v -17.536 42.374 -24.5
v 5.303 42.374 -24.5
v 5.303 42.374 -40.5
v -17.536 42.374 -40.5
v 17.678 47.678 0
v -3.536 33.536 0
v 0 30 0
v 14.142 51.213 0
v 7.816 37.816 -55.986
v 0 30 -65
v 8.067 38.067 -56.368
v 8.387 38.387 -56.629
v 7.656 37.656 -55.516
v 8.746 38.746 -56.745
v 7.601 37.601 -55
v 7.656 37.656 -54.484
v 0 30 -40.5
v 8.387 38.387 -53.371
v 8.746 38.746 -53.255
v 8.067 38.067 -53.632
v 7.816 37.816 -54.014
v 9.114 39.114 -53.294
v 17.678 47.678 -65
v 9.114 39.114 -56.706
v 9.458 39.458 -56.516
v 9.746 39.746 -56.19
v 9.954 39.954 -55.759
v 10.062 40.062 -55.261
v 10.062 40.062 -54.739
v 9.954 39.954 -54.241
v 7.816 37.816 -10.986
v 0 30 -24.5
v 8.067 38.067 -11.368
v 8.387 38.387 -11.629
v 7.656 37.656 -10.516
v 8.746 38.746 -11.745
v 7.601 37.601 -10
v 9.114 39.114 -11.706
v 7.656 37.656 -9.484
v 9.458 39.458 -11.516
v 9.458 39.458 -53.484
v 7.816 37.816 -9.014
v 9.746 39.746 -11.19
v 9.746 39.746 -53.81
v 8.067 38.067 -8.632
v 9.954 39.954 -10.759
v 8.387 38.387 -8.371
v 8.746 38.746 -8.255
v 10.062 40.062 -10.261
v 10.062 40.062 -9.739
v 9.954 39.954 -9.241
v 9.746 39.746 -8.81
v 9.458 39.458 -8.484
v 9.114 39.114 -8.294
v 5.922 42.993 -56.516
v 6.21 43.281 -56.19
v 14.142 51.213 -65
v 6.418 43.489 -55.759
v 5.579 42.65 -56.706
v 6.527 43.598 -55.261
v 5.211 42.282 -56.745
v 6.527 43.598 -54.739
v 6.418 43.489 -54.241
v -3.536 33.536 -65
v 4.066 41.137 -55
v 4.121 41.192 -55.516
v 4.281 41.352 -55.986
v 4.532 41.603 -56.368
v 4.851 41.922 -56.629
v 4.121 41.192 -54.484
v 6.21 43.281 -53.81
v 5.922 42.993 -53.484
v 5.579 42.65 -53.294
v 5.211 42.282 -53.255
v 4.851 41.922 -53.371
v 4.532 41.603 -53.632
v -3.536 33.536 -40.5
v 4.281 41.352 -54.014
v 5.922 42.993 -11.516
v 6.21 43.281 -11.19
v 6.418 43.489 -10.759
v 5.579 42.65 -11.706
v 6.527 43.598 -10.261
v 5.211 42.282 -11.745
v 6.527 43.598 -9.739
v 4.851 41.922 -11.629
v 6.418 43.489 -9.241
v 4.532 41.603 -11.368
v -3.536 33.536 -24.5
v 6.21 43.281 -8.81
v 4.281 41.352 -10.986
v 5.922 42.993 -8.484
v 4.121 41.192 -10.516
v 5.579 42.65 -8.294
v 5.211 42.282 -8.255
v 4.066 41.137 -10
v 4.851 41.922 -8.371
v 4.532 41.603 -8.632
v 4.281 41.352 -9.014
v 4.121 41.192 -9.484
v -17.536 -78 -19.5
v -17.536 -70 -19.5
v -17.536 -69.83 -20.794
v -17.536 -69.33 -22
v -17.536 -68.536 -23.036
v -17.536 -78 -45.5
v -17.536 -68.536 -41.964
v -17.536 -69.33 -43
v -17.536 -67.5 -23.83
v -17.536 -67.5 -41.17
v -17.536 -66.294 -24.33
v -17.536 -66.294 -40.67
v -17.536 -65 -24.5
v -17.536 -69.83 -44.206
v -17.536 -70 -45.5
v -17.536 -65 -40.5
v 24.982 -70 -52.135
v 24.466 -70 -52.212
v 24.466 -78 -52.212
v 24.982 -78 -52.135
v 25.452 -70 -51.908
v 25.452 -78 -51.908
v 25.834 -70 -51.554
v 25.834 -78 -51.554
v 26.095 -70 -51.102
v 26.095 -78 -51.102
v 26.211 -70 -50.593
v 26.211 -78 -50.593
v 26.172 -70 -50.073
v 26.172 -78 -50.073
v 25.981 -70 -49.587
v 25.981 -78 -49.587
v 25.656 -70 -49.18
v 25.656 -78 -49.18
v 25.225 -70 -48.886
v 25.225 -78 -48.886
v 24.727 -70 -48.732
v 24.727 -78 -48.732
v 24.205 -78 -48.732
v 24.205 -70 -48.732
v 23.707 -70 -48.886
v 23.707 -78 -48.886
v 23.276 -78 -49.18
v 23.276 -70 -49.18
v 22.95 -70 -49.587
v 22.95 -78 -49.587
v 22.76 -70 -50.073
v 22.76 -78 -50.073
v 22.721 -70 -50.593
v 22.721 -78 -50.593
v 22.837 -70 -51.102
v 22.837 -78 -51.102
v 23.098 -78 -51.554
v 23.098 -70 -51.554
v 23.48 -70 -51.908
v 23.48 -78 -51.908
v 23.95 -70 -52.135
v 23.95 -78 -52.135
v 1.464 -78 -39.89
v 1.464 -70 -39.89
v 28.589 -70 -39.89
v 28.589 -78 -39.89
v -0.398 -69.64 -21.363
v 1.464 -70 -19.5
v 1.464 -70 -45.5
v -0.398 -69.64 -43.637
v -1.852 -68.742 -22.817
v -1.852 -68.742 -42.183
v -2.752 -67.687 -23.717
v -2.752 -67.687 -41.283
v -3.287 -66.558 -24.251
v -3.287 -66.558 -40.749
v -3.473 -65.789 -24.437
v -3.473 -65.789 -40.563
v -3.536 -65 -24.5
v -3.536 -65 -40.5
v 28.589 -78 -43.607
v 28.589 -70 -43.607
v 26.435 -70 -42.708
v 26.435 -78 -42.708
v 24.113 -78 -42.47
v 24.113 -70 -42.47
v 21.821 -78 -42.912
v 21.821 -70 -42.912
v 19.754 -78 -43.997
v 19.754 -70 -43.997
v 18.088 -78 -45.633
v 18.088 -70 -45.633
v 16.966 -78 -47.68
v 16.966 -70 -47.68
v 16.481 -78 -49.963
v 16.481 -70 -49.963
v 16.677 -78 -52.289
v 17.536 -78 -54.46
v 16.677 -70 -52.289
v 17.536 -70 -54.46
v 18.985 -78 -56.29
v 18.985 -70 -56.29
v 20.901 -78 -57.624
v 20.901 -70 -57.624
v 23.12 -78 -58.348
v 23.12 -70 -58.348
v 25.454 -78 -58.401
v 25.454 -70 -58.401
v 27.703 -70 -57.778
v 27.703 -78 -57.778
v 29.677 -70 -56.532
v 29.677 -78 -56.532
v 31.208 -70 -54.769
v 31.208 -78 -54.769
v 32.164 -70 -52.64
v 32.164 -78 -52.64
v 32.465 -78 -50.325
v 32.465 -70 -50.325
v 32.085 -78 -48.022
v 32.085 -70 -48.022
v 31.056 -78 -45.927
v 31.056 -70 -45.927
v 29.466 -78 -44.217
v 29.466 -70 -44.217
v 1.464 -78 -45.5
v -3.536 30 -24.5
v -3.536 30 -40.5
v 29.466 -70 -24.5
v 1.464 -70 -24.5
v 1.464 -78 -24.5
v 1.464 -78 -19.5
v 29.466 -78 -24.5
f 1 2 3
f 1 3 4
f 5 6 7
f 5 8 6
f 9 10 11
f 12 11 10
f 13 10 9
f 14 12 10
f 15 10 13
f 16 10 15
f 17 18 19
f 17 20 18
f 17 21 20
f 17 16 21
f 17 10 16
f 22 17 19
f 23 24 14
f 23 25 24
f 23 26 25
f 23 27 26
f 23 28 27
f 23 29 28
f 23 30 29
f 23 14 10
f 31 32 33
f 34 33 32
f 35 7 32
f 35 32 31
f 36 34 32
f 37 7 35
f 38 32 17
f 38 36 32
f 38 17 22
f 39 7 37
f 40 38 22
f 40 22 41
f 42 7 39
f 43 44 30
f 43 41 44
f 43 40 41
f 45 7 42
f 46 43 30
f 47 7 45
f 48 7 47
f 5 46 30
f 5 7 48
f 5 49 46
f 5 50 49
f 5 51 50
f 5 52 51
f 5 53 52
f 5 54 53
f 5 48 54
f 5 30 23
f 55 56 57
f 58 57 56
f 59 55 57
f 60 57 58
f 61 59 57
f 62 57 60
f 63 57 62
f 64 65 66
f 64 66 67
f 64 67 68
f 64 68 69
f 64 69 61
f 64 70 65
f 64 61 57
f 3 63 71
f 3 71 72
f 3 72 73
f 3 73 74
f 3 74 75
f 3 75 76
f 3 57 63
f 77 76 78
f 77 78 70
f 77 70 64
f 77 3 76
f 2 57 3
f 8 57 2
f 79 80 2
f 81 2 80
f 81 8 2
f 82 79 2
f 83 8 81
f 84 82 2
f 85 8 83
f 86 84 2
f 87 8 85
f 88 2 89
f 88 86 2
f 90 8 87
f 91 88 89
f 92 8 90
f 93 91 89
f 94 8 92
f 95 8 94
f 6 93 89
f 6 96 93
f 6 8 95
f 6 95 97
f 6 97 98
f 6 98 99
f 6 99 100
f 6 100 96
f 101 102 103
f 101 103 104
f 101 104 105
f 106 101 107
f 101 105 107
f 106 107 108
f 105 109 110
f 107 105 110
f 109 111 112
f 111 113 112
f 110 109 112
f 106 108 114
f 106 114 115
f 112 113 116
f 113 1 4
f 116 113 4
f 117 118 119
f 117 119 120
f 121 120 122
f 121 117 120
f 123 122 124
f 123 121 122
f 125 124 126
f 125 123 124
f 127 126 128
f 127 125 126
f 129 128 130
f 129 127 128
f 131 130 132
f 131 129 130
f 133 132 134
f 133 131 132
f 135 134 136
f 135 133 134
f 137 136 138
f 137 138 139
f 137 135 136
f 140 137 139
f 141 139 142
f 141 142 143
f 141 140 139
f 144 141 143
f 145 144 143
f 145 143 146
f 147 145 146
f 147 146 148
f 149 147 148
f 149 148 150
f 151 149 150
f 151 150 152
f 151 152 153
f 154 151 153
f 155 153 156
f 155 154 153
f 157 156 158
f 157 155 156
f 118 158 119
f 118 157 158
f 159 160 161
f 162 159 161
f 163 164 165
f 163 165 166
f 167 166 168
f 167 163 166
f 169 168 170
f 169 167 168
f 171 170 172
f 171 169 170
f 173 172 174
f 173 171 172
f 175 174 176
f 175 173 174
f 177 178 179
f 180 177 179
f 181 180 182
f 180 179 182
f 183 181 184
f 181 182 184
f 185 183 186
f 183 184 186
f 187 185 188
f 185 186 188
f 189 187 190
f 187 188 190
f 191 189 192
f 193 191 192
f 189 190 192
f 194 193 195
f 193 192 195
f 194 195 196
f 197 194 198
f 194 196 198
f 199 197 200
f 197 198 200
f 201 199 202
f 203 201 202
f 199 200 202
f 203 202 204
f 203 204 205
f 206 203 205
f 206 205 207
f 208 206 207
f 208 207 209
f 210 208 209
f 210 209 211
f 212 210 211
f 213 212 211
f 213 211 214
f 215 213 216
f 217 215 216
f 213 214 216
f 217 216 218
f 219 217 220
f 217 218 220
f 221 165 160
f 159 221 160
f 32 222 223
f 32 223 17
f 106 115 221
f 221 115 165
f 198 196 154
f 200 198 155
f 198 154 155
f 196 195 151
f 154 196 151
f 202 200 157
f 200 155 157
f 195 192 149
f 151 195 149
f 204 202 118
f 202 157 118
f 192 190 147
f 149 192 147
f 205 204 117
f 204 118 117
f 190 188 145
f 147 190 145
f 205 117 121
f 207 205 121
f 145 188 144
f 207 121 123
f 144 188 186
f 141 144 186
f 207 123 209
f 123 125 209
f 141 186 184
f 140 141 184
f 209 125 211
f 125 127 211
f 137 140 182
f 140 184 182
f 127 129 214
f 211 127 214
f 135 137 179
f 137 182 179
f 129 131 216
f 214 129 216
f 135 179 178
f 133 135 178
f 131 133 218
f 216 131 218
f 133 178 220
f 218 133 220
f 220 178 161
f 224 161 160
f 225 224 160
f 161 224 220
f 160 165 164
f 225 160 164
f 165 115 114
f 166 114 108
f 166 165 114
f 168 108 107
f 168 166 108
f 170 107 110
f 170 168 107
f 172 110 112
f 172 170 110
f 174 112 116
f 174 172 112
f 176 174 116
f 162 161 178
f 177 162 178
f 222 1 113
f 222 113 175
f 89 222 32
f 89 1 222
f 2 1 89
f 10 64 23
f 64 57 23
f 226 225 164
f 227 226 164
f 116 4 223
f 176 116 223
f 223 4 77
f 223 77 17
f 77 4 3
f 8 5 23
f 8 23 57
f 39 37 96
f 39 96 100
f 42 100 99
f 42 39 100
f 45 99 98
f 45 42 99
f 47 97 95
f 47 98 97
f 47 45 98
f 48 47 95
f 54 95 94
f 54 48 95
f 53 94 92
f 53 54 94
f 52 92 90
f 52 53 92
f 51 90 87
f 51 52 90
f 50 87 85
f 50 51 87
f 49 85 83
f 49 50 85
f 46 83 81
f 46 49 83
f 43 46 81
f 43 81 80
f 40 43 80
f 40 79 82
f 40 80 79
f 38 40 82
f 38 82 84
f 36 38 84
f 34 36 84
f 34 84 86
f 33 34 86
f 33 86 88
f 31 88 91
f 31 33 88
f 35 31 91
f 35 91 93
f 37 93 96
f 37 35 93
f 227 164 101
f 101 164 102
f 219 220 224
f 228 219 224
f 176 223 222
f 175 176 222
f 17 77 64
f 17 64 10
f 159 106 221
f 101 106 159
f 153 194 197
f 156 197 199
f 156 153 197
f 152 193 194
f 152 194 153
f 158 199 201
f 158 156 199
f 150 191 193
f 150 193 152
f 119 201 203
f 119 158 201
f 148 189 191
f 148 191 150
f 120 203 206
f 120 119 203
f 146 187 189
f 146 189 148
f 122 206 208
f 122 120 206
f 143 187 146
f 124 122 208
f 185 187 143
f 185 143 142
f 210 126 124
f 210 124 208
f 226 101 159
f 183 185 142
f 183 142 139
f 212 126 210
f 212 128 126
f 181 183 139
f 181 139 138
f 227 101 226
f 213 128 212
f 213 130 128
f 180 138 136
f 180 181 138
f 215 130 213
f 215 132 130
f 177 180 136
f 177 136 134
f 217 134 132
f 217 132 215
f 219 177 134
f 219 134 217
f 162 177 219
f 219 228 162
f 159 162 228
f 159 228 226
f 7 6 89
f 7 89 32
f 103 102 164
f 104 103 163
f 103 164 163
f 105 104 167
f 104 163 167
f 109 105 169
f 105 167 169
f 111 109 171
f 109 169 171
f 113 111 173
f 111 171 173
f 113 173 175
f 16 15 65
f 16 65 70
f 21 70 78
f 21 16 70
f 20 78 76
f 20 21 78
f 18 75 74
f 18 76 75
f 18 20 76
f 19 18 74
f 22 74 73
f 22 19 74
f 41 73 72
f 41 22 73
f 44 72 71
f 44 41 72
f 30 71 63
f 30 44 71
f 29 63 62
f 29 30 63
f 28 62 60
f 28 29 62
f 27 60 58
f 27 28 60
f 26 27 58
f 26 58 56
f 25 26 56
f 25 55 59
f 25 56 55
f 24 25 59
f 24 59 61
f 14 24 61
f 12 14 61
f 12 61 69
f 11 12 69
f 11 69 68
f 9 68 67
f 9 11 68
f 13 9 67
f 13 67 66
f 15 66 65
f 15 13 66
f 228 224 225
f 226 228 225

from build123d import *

# Parameters (mm, degrees)
BOSS_EXTRUDE2_DEPTH      = 65
CUT_EXTRUDE1_DEPTH       = 82.266390279
CUT_EXTRUDE1_DEPTH_BACK  = 82.266390279
SKETCH4_R                = 1.75
BOSS_EXTRUDE3_DEPTH      = 8
BOSS_EXTRUDE3_DEPTH_BACK = 8
BOSS_EXTRUDE3_START      = -32.5
SKETCH9_W                = 14
SKETCH9_H                = 16
BOSS_EXTRUDE4_DEPTH      = 100
SKETCH10_R               = 1.75
BOSS_EXTRUDE5_DEPTH      = 8
FILLET4_R                = 5


with BuildPart() as part:
    # Sketch3 → Boss-Extrude2 (new body)
    with BuildSketch(Plane.XY):
        Polygon((-3.535533906, 33.535533906), (0, 30), (17.67766953, 47.67766953), (14.142135624, 51.213203436), align=None)
    extrude(amount=-BOSS_EXTRUDE2_DEPTH)

    # Sketch4 → Cut-Extrude1 (cut, two sides: drawn at the far end of the back side and taken through both)
    with BuildSketch(Plane(origin=(-18.535533906, 18.535533906, 0), x_dir=(0, 0, 1), z_dir=(-0.7071067811865477, 0.7071067811865475, 0)).offset(-CUT_EXTRUDE1_DEPTH_BACK)):
        with Locations(Location((-10, 33.713203436, 0), (0, 0, 270))):
            Circle(SKETCH4_R)
        with Locations(Location((-55, 33.713203436, 0), (0, 0, 270))):
            Circle(SKETCH4_R)
    extrude(amount=CUT_EXTRUDE1_DEPTH + CUT_EXTRUDE1_DEPTH_BACK, mode=Mode.SUBTRACT)

    # Sketch8 → Boss-Extrude3 (add, two sides: drawn at the far end of the back side and taken through both)
    with BuildSketch(Plane(origin=(0, 0, -65), x_dir=(-1, 0, 0), z_dir=(0, 0, -1)).offset(BOSS_EXTRUDE3_START - BOSS_EXTRUDE3_DEPTH_BACK)):
        Polygon((-5.303300859, 42.374368671), (17.535533906, 42.374368671), (17.535533906, 30), (0, 30), (3.535533906, 33.535533906), align=None)
    extrude(amount=BOSS_EXTRUDE3_DEPTH + BOSS_EXTRUDE3_DEPTH_BACK)

    # Sketch9 → Boss-Extrude4 (add)
    with BuildSketch(Plane.XZ.offset(-30)):
        with Locations((-10.535533906, -32.5)):
            Rectangle(SKETCH9_W, SKETCH9_H)
    extrude(amount=BOSS_EXTRUDE4_DEPTH)

    # Sketch10 → Boss-Extrude5 (add)
    with BuildSketch(Plane.XZ.offset(70)):
        with BuildLine():
            Line((29.465894629, -44.217395538), (29.465894629, -24.5))
            Line((29.465894629, -24.5), (1.464466094, -24.5))
            Line((1.464466094, -24.5), (1.464466094, -19.5))
            Line((1.464466094, -19.5), (-17.535533906, -19.5))
            Line((-17.535533906, -19.5), (-17.535533906, -45.5))
            Line((-17.535533906, -45.5), (1.464466094, -45.5))
            Line((1.464466094, -45.5), (1.464466094, -39.889528684))
            Line((1.464466094, -39.889528684), (28.589308321, -39.889528684))
            Line((28.589308321, -39.889528684), (28.589308321, -43.606924222))
            ThreePointArc((28.589308321, -43.606924222), (19.893987133, -57.027274483), (29.465894629, -44.217395538))
        make_face()
        with Locations(Location((24.465894629, -50.462393537, 0), (0, 0, 270))):
            Circle(SKETCH10_R, mode=Mode.SUBTRACT)
    extrude(amount=BOSS_EXTRUDE5_DEPTH)

    # Fillet4
    fillet4_edges = [part.edges().sort_by_distance(p)[0] for p in [
        (-10.535533906, -70, -40.5),
        (-10.535533906, -70, -24.5),
        (-3.535533906, -70, -32.5),
    ]]
    fillet(fillet4_edges, radius=FILLET4_R - 0.0001)  # a hair under: the kernel refuses the full size


solid = part.part
